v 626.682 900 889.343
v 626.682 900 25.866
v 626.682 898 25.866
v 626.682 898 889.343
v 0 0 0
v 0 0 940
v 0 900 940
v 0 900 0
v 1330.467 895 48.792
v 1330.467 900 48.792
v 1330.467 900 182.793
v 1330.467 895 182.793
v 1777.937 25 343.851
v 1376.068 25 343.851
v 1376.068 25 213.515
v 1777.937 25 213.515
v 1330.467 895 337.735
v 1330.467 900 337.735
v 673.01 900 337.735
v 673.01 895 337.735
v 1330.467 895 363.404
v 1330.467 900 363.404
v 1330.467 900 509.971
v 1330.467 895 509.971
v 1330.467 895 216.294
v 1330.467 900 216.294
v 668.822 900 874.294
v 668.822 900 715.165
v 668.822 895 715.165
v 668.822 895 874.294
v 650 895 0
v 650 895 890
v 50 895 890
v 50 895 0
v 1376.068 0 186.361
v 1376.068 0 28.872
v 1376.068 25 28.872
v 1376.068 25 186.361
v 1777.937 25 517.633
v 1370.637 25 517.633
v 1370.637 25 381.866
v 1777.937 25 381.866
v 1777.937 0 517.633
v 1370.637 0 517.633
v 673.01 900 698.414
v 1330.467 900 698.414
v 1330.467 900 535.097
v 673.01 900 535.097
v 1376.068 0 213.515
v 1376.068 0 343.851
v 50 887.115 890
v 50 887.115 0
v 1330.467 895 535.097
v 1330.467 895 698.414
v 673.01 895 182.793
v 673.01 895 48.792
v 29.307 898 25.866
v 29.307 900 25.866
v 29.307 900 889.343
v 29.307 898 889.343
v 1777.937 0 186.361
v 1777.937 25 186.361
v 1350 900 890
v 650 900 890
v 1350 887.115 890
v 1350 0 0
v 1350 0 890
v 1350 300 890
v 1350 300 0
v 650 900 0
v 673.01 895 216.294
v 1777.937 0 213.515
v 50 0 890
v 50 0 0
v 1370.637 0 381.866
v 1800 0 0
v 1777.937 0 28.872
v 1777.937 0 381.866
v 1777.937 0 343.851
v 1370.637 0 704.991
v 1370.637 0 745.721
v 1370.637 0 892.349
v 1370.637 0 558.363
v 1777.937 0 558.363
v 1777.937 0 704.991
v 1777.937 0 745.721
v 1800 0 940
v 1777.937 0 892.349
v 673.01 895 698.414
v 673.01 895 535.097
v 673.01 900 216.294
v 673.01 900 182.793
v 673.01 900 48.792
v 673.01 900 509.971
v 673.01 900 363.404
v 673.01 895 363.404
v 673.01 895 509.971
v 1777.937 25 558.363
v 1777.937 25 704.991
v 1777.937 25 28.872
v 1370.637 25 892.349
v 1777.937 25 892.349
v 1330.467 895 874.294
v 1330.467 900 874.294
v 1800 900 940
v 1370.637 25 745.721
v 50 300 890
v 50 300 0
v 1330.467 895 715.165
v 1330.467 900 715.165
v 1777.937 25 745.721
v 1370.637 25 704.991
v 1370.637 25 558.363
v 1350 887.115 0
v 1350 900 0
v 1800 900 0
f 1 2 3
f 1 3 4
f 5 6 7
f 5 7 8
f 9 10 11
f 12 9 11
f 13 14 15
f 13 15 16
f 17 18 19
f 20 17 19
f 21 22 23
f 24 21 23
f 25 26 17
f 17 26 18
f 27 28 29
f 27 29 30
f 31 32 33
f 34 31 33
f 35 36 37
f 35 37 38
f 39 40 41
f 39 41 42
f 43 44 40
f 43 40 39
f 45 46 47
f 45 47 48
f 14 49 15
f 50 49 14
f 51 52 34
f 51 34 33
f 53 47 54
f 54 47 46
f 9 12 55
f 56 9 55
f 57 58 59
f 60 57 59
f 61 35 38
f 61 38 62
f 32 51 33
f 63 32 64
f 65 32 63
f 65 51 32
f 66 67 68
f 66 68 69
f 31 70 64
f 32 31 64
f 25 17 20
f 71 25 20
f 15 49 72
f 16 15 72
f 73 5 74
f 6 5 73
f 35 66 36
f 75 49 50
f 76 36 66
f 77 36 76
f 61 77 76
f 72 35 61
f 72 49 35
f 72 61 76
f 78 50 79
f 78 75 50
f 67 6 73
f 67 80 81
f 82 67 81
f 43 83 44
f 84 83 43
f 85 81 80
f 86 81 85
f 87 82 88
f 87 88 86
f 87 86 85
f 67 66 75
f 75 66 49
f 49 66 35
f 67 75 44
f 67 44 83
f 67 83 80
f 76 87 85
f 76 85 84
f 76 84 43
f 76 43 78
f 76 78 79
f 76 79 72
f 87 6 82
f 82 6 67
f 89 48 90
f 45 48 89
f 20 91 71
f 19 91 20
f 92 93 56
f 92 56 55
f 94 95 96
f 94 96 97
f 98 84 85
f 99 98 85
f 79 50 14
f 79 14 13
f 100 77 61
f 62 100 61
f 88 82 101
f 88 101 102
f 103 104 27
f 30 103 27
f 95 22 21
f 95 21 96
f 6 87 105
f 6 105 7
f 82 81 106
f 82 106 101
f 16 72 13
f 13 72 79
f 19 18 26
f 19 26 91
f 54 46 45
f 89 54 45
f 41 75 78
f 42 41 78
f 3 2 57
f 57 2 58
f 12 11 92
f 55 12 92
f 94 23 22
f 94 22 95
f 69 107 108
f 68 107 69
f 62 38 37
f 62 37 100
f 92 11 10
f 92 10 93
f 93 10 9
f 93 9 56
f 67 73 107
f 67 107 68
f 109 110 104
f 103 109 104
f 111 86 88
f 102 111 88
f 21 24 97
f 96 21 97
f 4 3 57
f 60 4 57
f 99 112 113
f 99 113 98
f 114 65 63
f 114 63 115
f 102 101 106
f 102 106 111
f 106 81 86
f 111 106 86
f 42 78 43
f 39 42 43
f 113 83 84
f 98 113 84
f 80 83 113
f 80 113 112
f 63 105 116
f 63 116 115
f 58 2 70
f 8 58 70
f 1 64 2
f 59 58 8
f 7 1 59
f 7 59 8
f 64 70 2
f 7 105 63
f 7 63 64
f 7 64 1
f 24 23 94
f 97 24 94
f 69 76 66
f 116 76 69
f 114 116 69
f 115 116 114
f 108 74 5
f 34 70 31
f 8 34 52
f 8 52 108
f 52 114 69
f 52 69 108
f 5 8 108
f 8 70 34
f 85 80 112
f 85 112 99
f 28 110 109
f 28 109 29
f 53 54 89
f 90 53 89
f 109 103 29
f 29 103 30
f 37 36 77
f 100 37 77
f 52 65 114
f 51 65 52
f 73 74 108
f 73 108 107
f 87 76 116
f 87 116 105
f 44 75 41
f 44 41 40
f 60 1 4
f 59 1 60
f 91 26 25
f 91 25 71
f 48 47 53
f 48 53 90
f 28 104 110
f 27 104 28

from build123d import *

# Parameters (mm, degrees)
F1_DEPTH  = 900
F2_W      = 407.300591
F2_H      = 146.628201
F2_H_2    = 135.766893
F2_W_2    = 401.869893
F2_H_3    = 130.336196
F2_H_4    = 157.489581
F3_DEPTH  = 25
F4_W      = 1300
F4_H      = 36.11542
F5_DEPTH  = 890
F6_W      = 600
F6_H      = 890
F7_DEPTH  = 551
F5_FACE_W = 700
F5_FACE_H = 890
F8_DEPTH  = 551
F9_W      = 600
F9_H      = 890
F9_W_2    = 661.644458
F9_H_2    = 159.129679
F9_W_3    = 657.456815
F9_H_3    = 163.317263
F9_H_4    = 146.566809
F9_H_5    = 121.441066
F9_H_6    = 134.001598
F10_DEPTH = 5
F11_W     = 597.374253
F11_H     = 863.477323
F12_DEPTH = 2


with BuildPart() as f1:
    # F0 (on Front) → F1 (new body)
    with BuildSketch(Plane.XZ):
        Polygon((0, 940), (0, 0), (50, 0), (50, 890), (1350, 890), (1350, 0), (1800, 0), (1800, 940), align=None)
    extrude(amount=-F1_DEPTH)

    # F2 (on face) → F3 (cut)
    with BuildSketch(Plane.XZ):
        with Locations((1574.287116, 819.035083)):
            Rectangle(F2_W, F2_H)
        with Locations((1574.287116, 631.676822)):
            Rectangle(F2_W, F2_H)
        with Locations((1574.287116, 449.749216)):
            Rectangle(F2_W, F2_H_2)
        with Locations((1577.002465, 278.682962)):
            Rectangle(F2_W_2, F2_H_3)
        with Locations((1577.002465, 107.616686)):
            Rectangle(F2_W_2, F2_H_4)
    extrude(amount=-F3_DEPTH, mode=Mode.SUBTRACT)

    # F4 (on face) → F5 (join, through all)
    with BuildSketch(Plane(origin=(0, 0, 890), x_dir=(1, 0, 0), z_dir=(0, 0, -1))):
        with Locations((700, -318.05771)):
            Rectangle(F4_W, F4_H)
    extrude(amount=F5_DEPTH)

    # F6 (on face) → F7 (join)
    with BuildSketch(Plane(origin=(0, 336.11542, 0), x_dir=(-1, 0, 0), z_dir=(0, 1, 0))):
        with Locations((-350, 445)):
            Rectangle(F6_W, F6_H)
    extrude(amount=F7_DEPTH)

    # F5_face (on face) → F8 (join, through all)
    with BuildSketch(Plane(origin=(700, 336.11542, 445), x_dir=(-1, 0, 0), z_dir=(0, 1, 0))):
        with Locations((-300, 0)):
            Rectangle(F5_FACE_W, F5_FACE_H)
    extrude(amount=F8_DEPTH)

    # F9 (on face) → F10 (join)
    with BuildSketch(Plane(origin=(0, 900, 0), x_dir=(-1, 0, 0), z_dir=(0, 1, 0))):
        with Locations((-350, 445)):
            Rectangle(F9_W, F9_H)
        with Locations((-999.644637, 794.729382)):
            Rectangle(F9_W_2, F9_H_2)
        with Locations((-1001.738458, 616.755396)):
            Rectangle(F9_W_3, F9_H_3)
        with Locations((-1001.738458, 436.687618)):
            Rectangle(F9_W_3, F9_H_4)
        with Locations((-1001.738458, 277.014673)):
            Rectangle(F9_W_3, F9_H_5)
        with Locations((-1001.738458, 115.792371)):
            Rectangle(F9_W_3, F9_H_6)
    extrude(amount=-F10_DEPTH)

    # F11 (on face) → F12 (cut)
    with BuildSketch(Plane(origin=(0, 900, 0), x_dir=(-1, 0, 0), z_dir=(0, 1, 0))):
        with Locations((-327.994381, 457.60454)):
            Rectangle(F11_W, F11_H)
    extrude(amount=-F12_DEPTH, mode=Mode.SUBTRACT)


solid = f1.part
